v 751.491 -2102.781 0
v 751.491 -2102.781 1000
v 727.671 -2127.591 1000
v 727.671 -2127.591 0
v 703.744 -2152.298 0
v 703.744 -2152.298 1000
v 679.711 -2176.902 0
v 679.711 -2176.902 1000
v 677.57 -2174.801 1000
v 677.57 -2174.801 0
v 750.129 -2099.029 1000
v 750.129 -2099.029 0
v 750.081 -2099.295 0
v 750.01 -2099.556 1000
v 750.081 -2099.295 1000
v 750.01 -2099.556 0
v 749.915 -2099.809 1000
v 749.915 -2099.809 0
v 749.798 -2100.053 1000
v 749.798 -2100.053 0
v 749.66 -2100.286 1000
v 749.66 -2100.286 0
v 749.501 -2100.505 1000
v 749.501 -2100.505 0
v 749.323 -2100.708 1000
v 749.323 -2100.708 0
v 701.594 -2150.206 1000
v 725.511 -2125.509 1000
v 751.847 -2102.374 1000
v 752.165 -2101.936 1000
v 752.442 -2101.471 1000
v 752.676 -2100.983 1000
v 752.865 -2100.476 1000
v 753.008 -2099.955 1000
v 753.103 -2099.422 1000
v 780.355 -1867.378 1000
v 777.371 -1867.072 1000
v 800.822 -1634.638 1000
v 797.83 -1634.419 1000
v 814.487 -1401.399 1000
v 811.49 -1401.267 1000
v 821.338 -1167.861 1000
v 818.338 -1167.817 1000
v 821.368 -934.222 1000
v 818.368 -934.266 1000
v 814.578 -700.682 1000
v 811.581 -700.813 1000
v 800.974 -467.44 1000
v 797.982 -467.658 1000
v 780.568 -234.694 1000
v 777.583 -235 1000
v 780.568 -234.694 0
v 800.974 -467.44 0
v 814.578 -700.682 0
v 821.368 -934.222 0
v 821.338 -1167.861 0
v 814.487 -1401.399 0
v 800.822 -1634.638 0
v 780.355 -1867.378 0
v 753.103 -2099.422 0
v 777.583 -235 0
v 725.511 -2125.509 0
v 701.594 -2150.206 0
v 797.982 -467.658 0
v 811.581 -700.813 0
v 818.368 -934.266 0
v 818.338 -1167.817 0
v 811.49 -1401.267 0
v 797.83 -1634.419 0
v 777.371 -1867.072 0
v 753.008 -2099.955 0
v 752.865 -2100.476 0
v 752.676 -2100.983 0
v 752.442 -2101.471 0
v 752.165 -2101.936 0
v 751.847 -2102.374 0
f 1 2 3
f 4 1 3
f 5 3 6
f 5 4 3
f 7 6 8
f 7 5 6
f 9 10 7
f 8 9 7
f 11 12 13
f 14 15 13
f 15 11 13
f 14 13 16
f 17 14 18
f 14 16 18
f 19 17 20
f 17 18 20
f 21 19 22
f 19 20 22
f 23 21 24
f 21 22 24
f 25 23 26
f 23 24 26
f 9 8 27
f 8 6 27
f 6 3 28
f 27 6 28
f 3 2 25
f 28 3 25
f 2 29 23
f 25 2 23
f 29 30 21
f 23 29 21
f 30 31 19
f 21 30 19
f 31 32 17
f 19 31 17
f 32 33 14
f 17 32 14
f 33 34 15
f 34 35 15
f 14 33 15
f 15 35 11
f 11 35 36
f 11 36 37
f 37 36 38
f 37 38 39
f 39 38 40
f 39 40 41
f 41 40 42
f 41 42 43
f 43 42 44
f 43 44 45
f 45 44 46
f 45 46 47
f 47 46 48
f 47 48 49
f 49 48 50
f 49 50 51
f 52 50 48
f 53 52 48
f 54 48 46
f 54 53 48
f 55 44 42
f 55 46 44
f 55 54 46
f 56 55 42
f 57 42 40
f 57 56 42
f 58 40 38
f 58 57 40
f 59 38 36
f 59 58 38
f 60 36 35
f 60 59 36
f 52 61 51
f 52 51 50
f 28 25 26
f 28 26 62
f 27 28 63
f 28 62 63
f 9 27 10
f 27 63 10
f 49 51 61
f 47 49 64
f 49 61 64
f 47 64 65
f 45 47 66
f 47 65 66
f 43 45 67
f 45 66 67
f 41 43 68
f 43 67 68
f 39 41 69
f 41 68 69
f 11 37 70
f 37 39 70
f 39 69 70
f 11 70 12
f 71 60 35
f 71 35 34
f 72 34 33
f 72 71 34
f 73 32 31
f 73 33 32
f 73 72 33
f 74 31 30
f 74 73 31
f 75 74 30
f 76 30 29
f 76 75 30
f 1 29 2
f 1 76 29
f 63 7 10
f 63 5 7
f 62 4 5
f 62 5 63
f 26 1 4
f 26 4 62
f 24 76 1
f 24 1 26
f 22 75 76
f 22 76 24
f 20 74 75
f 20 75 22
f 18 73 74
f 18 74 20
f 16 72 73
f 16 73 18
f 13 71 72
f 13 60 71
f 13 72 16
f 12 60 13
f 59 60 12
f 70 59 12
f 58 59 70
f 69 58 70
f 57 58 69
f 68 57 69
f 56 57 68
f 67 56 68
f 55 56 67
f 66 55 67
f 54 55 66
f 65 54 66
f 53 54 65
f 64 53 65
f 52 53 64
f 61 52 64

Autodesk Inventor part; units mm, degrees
ref_plane "YZ Plane" through (0, 0, 0) normal (1, 0, 0) x (0, 1, 0)
ref_plane "XZ Plane" through (0, 0, 0) normal (0, 1, 0) x (-1, 0, 0)
ref_plane "XY Plane" through (0, 0, 0) normal (0, 0, 1) x (1, 0, 0)
sketch "Sketch1" plane through (0, 0, 0) normal (0, 0, 1) x (1, 0, 0)
  line L0 (-750, 0) -> (750, 0) construction
  line L1 (750, 0) -> (750, -2100) construction
  line L2 (750, -2100) -> (110, -2700) construction
  line L3 (108.907697, -2700) -> (-108.907697, -2700) construction
  line L4 (-110, -2700) -> (-750, -2100) construction
  line L5 (-750, -2100) -> (-750, 0) construction
  arc A0 (745.236855, 0.447083) -> (-745.236855, 0.447083) centre (0, -7964.766161) ccw construction
  arc A1 (-750.626493, -4.742884) -> (-777.58325, -235) centre (7180.794412, -1050) ccw construction
  arc A2 (-777.58325, -235) -> (-750.128547, -2099.028611) centre (7180.794412, -1050) ccw construction
  arc A3 (750.128547, -2099.028611) -> (777.58325, -235) centre (-7180.794412, -1050) ccw
  arc A4 (777.58325, -235) -> (750.626493, -4.742884) centre (-7180.794412, -1050) ccw construction
  line L6 (-777.58325, -235) -> (777.58325, -235) construction
  arc A5 (-749.322934, -2100.70831) -> (-677.569881, -2174.801078) centre (5033.298449, 3427.518345) ccw construction
  line L7 (-750, -2100) -> (750, -2100) construction
  line L8 (-547.172872, -2035.710935) -> (-801.083389, -2306.54882) construction
  arc A6 (-677.569881, -2174.801078) -> (-110.836747, -2699.297556) centre (5033.298449, 3427.518345) ccw construction
  arc A7 (-745.236855, 0.447083) -> (-750.626493, -4.742884) centre (-744.677927, -5.526826) ccw construction
  arc A8 (750.626493, -4.742884) -> (745.236855, 0.447083) centre (744.677927, -5.526826) ccw construction
  arc A9 (-750.128547, -2099.028611) -> (-749.322934, -2100.70831) centre (-747.154451, -2098.635225) ccw construction
  arc A10 (110.836747, -2699.297556) -> (677.569881, -2174.801078) centre (-5033.298449, 3427.518345) ccw construction
  line L9 (553.81945, -2042.800618) -> (794.436811, -2299.459137) construction
  arc A11 (677.569881, -2174.801078) -> (749.322934, -2100.70831) centre (-5033.298449, 3427.518345) ccw
  arc A12 (749.322934, -2100.70831) -> (750.128547, -2099.028611) centre (747.154451, -2098.635225) ccw
  arc A13 (-110.836747, -2699.297556) -> (-108.907697, -2700) centre (-108.907697, -2697) ccw construction
  arc A14 (108.907697, -2700) -> (110.836747, -2699.297556) centre (108.907697, -2697) ccw construction
  point P0 (0, 0)
  point P1 (0, 0)
  point P2 (0, 0)
  point P3 (0, -2700)
  point P4 (-674.128131, -2171.129877)
  point P5 (674.128131, -2171.129877)
  dimension "d19" = 1500
  dimension "d20" = 2100
  dimension "d21" = 220
  dimension "d22" = 2700
  dimension "d23" = 8000
  dimension "d24" = 8000
  dimension "d25" = 8000
  dimension "d26" = 235
  dimension "d27" = 8000
  dimension "d28" = 104
  dimension "d29" = 6
  dimension "d30" = 3
  dimension "d31" = 8000
  dimension "d32" = 104
  dimension "d33" = 3
contour flange "Contour Flange1" sketch "Sketch1" thickness 3 bend radius 3 width 1000 along (0, 0, 1) mid plane no both sides no wall seen from (713.565816, -2137.870332, 0) lies toward (0.718358, -0.6956736, 0) curves A11 A12 A3
bend "Bend1"
corner "Corner1"
equation "\"d19\" = d34"
equation "\"d20\" = d35"
equation "\"d21\" = d36"
equation "\"d22\" = d37"
equation "\"d24\" = d38"
equation "\"d25\" = d38"
equation "\"d26\" = d39"
equation "\"d27\" = d38"
equation "\"d28\" = d40"
equation "\"d29\" = d41 + d42"
equation "\"d30\" = d41"
equation "\"d31\" = d38"
equation "\"d8\" = Thickness"
equation "\"d9\" = BendReliefWidth"
equation "\"d10\" = BendReliefDepth"
equation "\"d11\" = MinimumRemnant"
equation "\"d12\" = TransitionRadius"
equation "\"d14\" = BendRadius"
equation "\"d16\" = CornerReliefSize"
equation "\"d17\" = GapSize"
equation "\"d18\" = JacobiRadiusSize"
equation "\"d32\" = d28"
equation "\"BendRadius\" = Thickness"
equation "\"BendReliefWidth\" = Thickness"
equation "\"BendReliefDepth\" = 0.5 * Thickness"
equation "\"CornerReliefSize\" = 4 * Thickness"
equation "\"MinimumRemnant\" = 2 * Thickness"
equation "\"TransitionRadius\" = BendRadius"
equation "\"JacobiRadiusSize\" = BendRadius"
equation "\"GapSize\" = Thickness"
equation "\"d42\" = d41"
equation "\"d34\" = 1500"
equation "\"d35\" = 2100"
equation "\"d36\" = 220"
equation "\"d38\" = 8000"
equation "\"d39\" = 235"
equation "\"d41\" = 3"
equation "\"Thickness\" = 3"
equation "\"d37\" = 2700"
equation "\"d40\" = 104"
properties part number "МОО 020 лист борт 1  Глеб_CPY"
